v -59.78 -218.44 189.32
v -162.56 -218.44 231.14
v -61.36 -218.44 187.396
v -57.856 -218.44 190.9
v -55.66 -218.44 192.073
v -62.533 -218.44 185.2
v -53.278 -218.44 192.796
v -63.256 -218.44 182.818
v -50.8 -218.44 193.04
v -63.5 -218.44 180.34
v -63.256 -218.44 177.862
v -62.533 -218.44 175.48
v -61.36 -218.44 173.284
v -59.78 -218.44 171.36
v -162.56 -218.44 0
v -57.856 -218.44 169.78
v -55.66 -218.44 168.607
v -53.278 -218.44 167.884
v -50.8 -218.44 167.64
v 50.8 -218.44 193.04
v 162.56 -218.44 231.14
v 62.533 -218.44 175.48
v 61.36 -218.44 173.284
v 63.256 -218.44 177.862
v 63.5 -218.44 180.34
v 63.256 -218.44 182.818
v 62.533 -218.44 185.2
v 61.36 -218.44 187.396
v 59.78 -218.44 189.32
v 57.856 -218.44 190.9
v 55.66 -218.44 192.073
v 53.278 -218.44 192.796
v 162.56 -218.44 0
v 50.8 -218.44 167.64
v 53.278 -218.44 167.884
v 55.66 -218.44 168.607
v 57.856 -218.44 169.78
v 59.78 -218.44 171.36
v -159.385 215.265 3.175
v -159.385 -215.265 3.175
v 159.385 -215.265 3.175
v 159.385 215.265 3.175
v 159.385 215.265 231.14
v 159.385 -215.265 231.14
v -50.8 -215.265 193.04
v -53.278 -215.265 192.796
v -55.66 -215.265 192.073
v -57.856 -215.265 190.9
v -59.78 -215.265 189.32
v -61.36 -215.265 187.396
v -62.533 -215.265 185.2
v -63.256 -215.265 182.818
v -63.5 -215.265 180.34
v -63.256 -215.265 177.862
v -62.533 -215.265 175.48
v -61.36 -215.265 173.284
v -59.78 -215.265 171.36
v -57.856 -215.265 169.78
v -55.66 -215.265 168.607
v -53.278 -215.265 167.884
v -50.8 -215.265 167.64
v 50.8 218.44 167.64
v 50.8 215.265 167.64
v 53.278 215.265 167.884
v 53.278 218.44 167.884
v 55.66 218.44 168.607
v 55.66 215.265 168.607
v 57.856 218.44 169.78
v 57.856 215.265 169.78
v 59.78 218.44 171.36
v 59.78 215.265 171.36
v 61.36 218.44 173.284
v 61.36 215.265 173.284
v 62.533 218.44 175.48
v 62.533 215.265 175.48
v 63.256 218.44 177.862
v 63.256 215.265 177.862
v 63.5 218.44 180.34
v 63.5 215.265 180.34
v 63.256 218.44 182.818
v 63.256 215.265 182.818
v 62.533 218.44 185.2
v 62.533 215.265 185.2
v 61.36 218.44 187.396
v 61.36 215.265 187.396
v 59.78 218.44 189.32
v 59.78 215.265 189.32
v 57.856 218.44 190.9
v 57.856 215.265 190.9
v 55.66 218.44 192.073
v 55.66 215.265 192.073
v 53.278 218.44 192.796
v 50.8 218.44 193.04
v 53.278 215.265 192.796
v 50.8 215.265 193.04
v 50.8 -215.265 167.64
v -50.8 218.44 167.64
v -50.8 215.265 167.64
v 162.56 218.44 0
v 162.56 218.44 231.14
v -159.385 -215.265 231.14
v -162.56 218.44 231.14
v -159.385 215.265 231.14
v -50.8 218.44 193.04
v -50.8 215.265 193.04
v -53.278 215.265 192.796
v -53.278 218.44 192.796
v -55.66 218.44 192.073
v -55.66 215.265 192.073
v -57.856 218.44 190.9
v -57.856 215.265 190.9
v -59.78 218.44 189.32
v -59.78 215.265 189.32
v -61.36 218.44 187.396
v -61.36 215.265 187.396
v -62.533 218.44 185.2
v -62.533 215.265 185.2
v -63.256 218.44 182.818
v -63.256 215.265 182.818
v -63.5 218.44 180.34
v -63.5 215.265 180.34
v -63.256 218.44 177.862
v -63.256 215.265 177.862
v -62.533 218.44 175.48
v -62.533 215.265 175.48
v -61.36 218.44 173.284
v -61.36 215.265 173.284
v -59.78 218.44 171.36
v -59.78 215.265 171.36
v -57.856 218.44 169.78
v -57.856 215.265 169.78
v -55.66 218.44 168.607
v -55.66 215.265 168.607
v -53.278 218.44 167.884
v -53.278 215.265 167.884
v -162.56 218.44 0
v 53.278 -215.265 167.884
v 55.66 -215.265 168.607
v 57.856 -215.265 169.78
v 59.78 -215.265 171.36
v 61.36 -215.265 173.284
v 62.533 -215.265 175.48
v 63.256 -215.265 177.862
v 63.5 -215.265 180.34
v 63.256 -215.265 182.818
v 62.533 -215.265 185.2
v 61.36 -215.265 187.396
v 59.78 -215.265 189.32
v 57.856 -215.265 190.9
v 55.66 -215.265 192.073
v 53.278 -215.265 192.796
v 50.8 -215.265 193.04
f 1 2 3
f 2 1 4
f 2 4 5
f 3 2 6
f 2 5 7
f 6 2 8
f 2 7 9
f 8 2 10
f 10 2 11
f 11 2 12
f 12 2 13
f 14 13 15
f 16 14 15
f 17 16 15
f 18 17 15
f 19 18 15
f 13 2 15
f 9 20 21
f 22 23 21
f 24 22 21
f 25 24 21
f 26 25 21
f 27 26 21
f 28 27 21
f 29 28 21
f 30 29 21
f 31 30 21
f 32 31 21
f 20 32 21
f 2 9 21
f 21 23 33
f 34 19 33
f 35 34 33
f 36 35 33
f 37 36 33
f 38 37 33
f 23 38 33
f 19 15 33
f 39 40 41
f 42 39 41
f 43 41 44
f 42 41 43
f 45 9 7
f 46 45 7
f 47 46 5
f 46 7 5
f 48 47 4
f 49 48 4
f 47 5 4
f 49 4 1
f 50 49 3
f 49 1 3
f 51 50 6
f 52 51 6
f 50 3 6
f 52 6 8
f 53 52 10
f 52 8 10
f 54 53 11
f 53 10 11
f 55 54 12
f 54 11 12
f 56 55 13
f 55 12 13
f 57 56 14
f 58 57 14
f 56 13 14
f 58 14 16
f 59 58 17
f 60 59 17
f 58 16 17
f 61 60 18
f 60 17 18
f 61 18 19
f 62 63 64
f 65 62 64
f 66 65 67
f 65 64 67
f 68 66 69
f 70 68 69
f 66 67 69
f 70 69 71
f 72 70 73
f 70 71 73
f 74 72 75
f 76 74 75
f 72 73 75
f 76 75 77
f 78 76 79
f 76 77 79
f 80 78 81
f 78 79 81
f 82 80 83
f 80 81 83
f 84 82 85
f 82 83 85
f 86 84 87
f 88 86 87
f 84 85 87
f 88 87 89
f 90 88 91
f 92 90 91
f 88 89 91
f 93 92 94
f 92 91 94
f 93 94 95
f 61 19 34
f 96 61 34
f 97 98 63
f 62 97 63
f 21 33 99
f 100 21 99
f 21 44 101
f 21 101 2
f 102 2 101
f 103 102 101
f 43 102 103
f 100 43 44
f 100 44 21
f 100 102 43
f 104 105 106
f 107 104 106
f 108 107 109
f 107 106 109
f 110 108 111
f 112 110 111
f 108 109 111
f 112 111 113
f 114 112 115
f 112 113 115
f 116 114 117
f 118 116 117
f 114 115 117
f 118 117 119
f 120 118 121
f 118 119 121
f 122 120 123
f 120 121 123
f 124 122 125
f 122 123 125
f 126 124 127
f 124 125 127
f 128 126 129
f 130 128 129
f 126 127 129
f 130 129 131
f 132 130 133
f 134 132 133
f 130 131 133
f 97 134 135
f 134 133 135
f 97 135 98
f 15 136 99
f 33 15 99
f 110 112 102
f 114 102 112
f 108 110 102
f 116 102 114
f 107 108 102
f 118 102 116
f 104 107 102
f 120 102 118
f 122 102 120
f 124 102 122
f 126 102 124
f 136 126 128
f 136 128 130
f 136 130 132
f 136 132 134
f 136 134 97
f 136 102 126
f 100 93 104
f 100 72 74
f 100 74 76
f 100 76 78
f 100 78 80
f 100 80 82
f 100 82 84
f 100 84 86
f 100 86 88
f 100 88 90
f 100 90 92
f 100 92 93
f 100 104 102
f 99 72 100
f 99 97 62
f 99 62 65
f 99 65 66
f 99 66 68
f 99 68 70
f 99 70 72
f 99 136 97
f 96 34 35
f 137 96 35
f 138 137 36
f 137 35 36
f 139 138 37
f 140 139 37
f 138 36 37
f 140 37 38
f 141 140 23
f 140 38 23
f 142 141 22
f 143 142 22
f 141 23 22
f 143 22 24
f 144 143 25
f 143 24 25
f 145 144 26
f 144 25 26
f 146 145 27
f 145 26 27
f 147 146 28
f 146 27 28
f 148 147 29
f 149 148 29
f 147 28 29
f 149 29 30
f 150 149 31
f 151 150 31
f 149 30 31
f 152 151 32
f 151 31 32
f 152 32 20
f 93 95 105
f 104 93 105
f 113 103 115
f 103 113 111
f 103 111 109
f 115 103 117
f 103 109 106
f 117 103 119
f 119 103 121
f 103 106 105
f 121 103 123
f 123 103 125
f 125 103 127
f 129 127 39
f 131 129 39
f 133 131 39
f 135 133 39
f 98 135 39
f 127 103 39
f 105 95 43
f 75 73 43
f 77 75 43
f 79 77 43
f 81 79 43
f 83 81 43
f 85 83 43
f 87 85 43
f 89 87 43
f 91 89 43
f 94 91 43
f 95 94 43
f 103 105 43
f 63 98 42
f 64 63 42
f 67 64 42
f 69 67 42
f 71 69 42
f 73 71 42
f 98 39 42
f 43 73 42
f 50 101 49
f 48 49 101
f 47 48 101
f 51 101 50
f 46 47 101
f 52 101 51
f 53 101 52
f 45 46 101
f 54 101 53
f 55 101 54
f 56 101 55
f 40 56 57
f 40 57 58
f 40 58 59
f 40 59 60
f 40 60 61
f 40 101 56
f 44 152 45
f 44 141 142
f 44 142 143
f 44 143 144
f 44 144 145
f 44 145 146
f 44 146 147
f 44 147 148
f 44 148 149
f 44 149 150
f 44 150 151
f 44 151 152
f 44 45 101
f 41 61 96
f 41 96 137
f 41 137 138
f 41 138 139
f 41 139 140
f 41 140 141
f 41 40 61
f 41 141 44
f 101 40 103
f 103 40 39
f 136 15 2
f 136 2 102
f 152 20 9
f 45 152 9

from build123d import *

# Parameters (mm, degrees)
F0_W     = 325.12
F0_H     = 436.88
F1_DEPTH = 231.14
F2_T     = -3.175
F4_DEPTH = 436.881


with BuildPart() as f1:
    # F0 (on Top) → F1 (new body)
    with BuildSketch(Plane.XY):
        Rectangle(F0_W, F0_H)
    extrude(amount=F1_DEPTH)

    # F2
    f2_openings = [f1.faces().sort_by_distance(p)[0] for p in [
        (0, 0, 231.14),
    ]]
    offset(amount=F2_T, openings=f2_openings)

    # F3 (on face) → F4 (cut, through all)
    with BuildSketch(Plane.XZ.offset(218.44)):
        with BuildLine():
            ThreePointArc((-50.8, 193.04), (-63.5, 180.34), (-50.8, 167.64))
            Line((-50.8, 167.64), (50.8, 167.64))
            ThreePointArc((50.8, 167.64), (63.5, 180.34), (50.8, 193.04))
            Line((50.8, 193.04), (-50.8, 193.04))
        make_face()
    extrude(amount=-F4_DEPTH, mode=Mode.SUBTRACT)


solid = f1.part
